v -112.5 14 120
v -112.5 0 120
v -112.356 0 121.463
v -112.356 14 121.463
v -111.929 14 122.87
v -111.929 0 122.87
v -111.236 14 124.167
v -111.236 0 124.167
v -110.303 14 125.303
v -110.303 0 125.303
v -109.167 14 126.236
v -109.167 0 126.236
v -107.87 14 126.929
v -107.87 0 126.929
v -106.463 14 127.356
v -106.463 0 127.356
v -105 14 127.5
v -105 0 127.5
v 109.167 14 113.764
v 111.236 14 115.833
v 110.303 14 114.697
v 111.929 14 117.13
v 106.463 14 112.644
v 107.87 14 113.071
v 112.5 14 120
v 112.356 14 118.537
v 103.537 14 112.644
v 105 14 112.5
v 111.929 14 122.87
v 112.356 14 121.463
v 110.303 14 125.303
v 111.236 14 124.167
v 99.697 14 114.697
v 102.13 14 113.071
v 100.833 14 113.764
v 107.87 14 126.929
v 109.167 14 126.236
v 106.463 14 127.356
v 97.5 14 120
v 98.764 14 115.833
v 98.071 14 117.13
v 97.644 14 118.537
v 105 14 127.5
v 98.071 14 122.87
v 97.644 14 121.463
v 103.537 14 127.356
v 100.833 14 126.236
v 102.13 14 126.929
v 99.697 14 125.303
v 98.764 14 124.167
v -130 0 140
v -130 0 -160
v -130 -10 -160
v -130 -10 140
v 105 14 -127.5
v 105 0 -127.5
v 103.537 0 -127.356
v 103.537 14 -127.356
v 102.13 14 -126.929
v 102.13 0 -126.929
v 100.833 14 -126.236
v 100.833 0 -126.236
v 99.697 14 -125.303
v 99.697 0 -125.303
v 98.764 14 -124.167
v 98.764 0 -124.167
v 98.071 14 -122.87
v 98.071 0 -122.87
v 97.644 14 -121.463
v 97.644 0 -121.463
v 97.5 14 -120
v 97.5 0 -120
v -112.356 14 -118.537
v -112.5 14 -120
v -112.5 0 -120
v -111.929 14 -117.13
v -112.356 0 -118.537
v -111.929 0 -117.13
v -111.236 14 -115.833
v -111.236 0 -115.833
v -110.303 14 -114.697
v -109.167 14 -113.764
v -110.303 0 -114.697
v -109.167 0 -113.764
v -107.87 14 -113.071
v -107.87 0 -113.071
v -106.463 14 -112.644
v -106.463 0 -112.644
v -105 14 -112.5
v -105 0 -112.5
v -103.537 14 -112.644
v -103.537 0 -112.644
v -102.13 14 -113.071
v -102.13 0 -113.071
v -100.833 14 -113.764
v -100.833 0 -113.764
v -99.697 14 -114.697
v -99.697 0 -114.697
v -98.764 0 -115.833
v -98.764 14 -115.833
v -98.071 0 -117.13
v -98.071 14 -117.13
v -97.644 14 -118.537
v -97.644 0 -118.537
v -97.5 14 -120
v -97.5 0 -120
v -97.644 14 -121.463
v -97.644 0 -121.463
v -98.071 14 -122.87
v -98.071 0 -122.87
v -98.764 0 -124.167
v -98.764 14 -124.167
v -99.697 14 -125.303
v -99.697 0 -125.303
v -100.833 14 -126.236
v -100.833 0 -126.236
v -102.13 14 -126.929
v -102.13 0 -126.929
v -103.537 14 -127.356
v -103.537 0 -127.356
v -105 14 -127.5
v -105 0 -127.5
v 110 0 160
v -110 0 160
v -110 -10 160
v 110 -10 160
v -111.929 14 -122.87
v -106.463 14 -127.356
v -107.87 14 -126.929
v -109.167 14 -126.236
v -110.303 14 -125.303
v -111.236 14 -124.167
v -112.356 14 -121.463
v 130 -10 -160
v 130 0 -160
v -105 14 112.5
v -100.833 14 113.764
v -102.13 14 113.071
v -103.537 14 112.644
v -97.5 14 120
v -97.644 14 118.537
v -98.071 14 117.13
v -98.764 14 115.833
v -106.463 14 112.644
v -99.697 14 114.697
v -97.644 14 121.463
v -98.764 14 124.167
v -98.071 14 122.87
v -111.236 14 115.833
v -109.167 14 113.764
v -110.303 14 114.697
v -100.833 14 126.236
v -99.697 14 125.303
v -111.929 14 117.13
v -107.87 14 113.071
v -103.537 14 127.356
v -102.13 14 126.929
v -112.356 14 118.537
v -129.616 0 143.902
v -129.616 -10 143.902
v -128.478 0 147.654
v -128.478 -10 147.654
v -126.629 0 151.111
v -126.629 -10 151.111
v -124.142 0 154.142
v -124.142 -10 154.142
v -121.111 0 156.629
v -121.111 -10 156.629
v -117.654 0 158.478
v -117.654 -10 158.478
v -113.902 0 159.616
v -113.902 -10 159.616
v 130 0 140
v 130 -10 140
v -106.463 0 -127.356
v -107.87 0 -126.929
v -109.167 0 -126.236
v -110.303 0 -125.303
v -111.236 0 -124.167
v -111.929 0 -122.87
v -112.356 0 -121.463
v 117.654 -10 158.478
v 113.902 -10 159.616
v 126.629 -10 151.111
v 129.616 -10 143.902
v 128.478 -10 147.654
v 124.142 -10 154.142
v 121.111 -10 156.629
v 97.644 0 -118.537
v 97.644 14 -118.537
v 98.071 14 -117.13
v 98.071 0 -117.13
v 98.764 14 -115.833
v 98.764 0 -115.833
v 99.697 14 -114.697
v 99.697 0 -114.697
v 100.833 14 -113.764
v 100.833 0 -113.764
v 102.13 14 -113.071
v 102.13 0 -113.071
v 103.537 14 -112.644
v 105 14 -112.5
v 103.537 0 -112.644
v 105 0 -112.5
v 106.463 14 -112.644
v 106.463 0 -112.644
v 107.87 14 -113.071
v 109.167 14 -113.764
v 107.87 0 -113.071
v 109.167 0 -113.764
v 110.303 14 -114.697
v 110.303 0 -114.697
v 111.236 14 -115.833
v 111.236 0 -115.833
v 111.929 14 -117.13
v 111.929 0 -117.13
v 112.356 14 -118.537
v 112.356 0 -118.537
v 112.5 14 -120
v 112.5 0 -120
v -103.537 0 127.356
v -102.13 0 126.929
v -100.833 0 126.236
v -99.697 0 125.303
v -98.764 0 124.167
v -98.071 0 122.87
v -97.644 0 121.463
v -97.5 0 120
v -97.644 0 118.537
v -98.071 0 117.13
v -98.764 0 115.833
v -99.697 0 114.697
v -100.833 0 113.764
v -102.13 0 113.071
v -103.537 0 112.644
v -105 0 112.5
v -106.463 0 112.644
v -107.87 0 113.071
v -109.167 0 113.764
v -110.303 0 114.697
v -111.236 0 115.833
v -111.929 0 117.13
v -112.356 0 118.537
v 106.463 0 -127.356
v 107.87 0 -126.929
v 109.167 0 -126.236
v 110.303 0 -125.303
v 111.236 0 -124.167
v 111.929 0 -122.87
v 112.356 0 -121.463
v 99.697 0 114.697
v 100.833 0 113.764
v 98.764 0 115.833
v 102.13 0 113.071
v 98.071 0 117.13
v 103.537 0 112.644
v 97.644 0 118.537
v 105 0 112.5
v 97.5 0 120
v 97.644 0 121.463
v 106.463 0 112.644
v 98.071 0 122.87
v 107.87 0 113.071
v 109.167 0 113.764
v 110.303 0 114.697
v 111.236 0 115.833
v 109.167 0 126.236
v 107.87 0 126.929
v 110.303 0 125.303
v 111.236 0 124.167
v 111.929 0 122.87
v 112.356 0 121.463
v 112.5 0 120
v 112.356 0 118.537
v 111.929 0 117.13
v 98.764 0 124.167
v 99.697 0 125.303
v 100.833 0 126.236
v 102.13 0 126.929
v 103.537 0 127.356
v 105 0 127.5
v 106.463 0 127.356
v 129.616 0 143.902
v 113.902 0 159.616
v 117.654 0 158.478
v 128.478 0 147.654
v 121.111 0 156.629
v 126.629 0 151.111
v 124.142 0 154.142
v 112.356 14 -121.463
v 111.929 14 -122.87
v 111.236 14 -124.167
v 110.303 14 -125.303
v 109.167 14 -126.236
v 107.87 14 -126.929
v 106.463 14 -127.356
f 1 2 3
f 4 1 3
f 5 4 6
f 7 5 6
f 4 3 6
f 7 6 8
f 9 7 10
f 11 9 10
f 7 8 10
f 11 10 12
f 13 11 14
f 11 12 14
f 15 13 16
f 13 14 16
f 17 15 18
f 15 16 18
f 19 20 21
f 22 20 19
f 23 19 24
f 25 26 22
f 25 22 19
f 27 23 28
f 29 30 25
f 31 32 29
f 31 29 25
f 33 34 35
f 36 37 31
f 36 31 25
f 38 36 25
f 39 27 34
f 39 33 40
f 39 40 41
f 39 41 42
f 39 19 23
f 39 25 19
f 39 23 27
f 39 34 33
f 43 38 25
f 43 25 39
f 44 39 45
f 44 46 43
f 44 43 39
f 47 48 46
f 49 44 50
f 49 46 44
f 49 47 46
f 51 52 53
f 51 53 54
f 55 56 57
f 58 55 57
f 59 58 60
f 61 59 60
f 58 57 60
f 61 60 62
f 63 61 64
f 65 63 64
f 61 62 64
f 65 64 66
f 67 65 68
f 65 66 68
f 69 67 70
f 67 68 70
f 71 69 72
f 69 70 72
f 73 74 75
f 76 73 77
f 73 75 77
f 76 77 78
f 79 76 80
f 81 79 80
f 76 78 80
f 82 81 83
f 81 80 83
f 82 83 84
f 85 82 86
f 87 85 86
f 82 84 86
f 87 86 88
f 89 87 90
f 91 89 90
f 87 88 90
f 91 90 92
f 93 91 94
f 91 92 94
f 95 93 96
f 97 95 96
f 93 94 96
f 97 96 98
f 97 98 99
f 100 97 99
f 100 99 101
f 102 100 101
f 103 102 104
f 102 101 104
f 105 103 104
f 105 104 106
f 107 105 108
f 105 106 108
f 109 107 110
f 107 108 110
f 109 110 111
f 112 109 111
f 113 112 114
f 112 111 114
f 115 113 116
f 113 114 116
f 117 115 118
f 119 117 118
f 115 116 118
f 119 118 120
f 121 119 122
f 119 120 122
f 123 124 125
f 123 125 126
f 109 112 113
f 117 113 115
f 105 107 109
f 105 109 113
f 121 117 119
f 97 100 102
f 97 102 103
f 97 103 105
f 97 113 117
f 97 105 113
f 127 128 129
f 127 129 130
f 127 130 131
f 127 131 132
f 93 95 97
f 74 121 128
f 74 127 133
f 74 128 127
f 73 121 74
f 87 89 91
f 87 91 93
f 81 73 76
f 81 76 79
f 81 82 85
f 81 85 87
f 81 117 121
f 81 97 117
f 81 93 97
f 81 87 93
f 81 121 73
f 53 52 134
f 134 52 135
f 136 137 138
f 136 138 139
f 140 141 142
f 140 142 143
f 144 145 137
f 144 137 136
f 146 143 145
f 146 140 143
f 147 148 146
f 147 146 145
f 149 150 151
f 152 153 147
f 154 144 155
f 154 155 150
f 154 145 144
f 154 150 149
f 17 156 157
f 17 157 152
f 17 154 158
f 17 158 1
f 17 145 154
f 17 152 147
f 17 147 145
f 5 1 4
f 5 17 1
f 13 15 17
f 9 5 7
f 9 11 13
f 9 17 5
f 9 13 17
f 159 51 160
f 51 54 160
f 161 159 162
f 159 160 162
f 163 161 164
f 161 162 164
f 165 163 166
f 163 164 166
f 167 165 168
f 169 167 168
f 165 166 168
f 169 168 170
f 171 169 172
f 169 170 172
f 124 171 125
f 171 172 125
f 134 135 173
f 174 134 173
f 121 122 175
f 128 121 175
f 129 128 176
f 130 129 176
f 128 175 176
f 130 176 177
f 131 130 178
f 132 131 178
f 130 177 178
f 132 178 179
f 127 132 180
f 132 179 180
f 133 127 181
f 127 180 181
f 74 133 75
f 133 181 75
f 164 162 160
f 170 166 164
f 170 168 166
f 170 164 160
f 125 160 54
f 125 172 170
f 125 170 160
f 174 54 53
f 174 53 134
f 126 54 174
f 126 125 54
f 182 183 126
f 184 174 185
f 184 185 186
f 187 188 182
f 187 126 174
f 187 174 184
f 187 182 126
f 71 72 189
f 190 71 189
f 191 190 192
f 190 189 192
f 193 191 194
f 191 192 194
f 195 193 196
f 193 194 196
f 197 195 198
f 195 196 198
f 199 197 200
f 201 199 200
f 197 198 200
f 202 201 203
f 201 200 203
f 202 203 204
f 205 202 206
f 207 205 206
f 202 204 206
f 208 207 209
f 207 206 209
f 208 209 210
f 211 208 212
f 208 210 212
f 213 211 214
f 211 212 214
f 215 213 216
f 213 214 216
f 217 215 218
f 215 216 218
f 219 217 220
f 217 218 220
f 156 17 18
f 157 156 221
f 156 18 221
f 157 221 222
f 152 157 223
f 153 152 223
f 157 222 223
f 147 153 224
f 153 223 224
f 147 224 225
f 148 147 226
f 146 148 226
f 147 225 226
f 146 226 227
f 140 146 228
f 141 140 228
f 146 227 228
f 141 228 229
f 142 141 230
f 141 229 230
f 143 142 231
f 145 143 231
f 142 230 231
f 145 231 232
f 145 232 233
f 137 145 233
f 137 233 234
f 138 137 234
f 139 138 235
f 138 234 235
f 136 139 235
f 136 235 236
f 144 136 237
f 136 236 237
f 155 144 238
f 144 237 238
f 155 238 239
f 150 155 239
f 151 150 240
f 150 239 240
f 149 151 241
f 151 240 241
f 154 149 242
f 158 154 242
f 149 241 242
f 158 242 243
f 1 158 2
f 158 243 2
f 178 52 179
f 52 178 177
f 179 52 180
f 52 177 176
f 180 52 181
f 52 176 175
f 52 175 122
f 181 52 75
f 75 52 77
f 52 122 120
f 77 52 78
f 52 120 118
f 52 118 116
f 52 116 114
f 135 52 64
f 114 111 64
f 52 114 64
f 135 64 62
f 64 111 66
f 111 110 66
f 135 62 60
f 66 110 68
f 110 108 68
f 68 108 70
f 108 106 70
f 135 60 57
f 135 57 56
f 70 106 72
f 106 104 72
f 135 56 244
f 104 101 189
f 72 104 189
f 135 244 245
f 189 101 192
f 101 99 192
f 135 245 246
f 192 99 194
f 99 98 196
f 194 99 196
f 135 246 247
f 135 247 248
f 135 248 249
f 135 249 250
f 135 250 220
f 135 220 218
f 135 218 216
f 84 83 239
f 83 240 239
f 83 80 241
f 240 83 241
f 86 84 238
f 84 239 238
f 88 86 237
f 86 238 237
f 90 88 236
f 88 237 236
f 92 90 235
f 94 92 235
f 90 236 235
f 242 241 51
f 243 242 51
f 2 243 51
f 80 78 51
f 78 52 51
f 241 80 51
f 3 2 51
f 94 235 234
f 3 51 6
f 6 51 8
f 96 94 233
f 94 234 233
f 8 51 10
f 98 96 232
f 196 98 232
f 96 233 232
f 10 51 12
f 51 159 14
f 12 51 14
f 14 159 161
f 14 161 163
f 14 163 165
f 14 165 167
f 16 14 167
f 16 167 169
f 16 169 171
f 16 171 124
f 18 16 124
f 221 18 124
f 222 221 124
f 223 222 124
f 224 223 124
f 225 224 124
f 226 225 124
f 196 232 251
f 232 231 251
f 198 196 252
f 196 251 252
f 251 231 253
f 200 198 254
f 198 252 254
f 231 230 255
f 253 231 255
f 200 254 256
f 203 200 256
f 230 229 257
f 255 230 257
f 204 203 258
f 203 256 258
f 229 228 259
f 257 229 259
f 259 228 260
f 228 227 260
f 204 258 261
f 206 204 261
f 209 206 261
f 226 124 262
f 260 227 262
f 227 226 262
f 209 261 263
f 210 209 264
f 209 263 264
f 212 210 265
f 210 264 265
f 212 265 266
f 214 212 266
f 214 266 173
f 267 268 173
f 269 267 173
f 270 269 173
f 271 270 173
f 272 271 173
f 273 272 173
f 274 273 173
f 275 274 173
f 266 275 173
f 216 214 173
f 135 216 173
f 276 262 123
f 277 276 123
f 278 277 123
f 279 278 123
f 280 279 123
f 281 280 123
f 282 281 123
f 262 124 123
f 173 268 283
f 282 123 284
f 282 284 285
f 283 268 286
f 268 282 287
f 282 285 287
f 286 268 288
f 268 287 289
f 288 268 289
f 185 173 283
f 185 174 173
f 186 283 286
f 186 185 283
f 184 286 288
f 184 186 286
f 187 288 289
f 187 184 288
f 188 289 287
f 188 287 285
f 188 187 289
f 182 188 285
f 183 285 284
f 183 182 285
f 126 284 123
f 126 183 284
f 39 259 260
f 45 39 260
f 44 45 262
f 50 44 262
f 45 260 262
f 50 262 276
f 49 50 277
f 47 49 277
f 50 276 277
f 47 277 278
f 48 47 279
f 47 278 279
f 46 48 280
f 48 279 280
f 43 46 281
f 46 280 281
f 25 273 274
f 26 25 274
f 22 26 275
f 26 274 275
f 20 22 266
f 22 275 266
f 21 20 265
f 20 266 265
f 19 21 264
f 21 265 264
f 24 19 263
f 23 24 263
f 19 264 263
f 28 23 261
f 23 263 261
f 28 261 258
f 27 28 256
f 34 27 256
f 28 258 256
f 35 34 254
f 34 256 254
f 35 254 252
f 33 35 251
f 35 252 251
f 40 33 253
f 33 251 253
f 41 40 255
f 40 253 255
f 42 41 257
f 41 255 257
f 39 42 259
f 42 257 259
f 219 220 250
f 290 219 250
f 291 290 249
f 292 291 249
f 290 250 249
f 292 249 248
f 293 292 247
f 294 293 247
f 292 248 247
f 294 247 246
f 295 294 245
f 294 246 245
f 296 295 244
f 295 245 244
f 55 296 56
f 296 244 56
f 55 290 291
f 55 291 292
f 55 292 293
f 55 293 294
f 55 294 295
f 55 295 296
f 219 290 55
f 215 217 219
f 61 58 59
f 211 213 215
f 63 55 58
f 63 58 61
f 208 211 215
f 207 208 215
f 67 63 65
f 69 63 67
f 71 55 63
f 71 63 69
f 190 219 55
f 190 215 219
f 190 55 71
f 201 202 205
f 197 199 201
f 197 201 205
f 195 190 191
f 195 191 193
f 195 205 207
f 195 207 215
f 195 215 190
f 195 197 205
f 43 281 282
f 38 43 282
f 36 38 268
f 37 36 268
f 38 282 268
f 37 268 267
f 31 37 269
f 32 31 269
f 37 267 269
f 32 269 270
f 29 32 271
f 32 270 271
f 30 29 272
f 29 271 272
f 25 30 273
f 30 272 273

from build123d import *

# Parameters (mm, degrees)
F0_W     = 260
F0_H     = 320
F1_DEPTH = 10
F2_R     = 20
F4_DEPTH = 14


with BuildPart() as f1:
    # F0 (on Front) → F1 (new body)
    with BuildSketch(Plane.XZ):
        Rectangle(F0_W, F0_H)
    extrude(amount=F1_DEPTH)

    # F2
    f2_edges = [f1.edges().sort_by_distance(p)[0] for p in [
        (-130, -5, 160),
        (130, -5, 160),
    ]]
    fillet(f2_edges, radius=F2_R)

    # F3 (on face) → F4 (join)
    with BuildSketch(Plane(origin=(0, 0, 0), x_dir=(-1, 0, 0), z_dir=(0, 1, 0))):
        with BuildLine():
            ThreePointArc((-97.5, -120), (-105, -112.5), (-112.5, -120))
            Line((-112.5, -120), (-105, -120))
            Line((-105, -120), (-105, -127.5))
            ThreePointArc((-105, -127.5), (-99.696699, -125.303301), (-97.5, -120))
        make_face()
        with BuildLine():
            Line((-105, -120), (-112.5, -120))
            ThreePointArc((-112.5, -120), (-110.303301, -125.303301), (-105, -127.5))
            Line((-105, -127.5), (-105, -120))
        make_face()
        with BuildLine():
            ThreePointArc((105, -127.5), (110.303301, -125.303301), (112.5, -120))
            Line((112.5, -120), (105, -120))
            Line((105, -120), (105, -127.5))
        make_face()
        with BuildLine():
            Line((105, -120), (112.5, -120))
            ThreePointArc((112.5, -120), (99.696699, -114.696699), (105, -127.5))
            Line((105, -127.5), (105, -120))
        make_face()
        with BuildLine():
            ThreePointArc((105, 127.5), (99.696699, 114.696699), (112.5, 120))
            Line((112.5, 120), (105, 120))
            Line((105, 120), (105, 127.5))
        make_face()
        with BuildLine():
            Line((105, 120), (112.5, 120))
            ThreePointArc((112.5, 120), (110.303301, 125.303301), (105, 127.5))
            Line((105, 127.5), (105, 120))
        make_face()
        with BuildLine():
            ThreePointArc((-105, 127.5), (-110.303301, 125.303301), (-112.5, 120))
            Line((-112.5, 120), (-105, 120))
            Line((-105, 120), (-105, 127.5))
        make_face()
        with BuildLine():
            Line((-105, 120), (-112.5, 120))
            ThreePointArc((-112.5, 120), (-105, 112.5), (-97.5, 120))
            ThreePointArc((-97.5, 120), (-99.696699, 125.303301), (-105, 127.5))
            Line((-105, 127.5), (-105, 120))
        make_face()
    extrude(amount=F4_DEPTH)


solid = f1.part
